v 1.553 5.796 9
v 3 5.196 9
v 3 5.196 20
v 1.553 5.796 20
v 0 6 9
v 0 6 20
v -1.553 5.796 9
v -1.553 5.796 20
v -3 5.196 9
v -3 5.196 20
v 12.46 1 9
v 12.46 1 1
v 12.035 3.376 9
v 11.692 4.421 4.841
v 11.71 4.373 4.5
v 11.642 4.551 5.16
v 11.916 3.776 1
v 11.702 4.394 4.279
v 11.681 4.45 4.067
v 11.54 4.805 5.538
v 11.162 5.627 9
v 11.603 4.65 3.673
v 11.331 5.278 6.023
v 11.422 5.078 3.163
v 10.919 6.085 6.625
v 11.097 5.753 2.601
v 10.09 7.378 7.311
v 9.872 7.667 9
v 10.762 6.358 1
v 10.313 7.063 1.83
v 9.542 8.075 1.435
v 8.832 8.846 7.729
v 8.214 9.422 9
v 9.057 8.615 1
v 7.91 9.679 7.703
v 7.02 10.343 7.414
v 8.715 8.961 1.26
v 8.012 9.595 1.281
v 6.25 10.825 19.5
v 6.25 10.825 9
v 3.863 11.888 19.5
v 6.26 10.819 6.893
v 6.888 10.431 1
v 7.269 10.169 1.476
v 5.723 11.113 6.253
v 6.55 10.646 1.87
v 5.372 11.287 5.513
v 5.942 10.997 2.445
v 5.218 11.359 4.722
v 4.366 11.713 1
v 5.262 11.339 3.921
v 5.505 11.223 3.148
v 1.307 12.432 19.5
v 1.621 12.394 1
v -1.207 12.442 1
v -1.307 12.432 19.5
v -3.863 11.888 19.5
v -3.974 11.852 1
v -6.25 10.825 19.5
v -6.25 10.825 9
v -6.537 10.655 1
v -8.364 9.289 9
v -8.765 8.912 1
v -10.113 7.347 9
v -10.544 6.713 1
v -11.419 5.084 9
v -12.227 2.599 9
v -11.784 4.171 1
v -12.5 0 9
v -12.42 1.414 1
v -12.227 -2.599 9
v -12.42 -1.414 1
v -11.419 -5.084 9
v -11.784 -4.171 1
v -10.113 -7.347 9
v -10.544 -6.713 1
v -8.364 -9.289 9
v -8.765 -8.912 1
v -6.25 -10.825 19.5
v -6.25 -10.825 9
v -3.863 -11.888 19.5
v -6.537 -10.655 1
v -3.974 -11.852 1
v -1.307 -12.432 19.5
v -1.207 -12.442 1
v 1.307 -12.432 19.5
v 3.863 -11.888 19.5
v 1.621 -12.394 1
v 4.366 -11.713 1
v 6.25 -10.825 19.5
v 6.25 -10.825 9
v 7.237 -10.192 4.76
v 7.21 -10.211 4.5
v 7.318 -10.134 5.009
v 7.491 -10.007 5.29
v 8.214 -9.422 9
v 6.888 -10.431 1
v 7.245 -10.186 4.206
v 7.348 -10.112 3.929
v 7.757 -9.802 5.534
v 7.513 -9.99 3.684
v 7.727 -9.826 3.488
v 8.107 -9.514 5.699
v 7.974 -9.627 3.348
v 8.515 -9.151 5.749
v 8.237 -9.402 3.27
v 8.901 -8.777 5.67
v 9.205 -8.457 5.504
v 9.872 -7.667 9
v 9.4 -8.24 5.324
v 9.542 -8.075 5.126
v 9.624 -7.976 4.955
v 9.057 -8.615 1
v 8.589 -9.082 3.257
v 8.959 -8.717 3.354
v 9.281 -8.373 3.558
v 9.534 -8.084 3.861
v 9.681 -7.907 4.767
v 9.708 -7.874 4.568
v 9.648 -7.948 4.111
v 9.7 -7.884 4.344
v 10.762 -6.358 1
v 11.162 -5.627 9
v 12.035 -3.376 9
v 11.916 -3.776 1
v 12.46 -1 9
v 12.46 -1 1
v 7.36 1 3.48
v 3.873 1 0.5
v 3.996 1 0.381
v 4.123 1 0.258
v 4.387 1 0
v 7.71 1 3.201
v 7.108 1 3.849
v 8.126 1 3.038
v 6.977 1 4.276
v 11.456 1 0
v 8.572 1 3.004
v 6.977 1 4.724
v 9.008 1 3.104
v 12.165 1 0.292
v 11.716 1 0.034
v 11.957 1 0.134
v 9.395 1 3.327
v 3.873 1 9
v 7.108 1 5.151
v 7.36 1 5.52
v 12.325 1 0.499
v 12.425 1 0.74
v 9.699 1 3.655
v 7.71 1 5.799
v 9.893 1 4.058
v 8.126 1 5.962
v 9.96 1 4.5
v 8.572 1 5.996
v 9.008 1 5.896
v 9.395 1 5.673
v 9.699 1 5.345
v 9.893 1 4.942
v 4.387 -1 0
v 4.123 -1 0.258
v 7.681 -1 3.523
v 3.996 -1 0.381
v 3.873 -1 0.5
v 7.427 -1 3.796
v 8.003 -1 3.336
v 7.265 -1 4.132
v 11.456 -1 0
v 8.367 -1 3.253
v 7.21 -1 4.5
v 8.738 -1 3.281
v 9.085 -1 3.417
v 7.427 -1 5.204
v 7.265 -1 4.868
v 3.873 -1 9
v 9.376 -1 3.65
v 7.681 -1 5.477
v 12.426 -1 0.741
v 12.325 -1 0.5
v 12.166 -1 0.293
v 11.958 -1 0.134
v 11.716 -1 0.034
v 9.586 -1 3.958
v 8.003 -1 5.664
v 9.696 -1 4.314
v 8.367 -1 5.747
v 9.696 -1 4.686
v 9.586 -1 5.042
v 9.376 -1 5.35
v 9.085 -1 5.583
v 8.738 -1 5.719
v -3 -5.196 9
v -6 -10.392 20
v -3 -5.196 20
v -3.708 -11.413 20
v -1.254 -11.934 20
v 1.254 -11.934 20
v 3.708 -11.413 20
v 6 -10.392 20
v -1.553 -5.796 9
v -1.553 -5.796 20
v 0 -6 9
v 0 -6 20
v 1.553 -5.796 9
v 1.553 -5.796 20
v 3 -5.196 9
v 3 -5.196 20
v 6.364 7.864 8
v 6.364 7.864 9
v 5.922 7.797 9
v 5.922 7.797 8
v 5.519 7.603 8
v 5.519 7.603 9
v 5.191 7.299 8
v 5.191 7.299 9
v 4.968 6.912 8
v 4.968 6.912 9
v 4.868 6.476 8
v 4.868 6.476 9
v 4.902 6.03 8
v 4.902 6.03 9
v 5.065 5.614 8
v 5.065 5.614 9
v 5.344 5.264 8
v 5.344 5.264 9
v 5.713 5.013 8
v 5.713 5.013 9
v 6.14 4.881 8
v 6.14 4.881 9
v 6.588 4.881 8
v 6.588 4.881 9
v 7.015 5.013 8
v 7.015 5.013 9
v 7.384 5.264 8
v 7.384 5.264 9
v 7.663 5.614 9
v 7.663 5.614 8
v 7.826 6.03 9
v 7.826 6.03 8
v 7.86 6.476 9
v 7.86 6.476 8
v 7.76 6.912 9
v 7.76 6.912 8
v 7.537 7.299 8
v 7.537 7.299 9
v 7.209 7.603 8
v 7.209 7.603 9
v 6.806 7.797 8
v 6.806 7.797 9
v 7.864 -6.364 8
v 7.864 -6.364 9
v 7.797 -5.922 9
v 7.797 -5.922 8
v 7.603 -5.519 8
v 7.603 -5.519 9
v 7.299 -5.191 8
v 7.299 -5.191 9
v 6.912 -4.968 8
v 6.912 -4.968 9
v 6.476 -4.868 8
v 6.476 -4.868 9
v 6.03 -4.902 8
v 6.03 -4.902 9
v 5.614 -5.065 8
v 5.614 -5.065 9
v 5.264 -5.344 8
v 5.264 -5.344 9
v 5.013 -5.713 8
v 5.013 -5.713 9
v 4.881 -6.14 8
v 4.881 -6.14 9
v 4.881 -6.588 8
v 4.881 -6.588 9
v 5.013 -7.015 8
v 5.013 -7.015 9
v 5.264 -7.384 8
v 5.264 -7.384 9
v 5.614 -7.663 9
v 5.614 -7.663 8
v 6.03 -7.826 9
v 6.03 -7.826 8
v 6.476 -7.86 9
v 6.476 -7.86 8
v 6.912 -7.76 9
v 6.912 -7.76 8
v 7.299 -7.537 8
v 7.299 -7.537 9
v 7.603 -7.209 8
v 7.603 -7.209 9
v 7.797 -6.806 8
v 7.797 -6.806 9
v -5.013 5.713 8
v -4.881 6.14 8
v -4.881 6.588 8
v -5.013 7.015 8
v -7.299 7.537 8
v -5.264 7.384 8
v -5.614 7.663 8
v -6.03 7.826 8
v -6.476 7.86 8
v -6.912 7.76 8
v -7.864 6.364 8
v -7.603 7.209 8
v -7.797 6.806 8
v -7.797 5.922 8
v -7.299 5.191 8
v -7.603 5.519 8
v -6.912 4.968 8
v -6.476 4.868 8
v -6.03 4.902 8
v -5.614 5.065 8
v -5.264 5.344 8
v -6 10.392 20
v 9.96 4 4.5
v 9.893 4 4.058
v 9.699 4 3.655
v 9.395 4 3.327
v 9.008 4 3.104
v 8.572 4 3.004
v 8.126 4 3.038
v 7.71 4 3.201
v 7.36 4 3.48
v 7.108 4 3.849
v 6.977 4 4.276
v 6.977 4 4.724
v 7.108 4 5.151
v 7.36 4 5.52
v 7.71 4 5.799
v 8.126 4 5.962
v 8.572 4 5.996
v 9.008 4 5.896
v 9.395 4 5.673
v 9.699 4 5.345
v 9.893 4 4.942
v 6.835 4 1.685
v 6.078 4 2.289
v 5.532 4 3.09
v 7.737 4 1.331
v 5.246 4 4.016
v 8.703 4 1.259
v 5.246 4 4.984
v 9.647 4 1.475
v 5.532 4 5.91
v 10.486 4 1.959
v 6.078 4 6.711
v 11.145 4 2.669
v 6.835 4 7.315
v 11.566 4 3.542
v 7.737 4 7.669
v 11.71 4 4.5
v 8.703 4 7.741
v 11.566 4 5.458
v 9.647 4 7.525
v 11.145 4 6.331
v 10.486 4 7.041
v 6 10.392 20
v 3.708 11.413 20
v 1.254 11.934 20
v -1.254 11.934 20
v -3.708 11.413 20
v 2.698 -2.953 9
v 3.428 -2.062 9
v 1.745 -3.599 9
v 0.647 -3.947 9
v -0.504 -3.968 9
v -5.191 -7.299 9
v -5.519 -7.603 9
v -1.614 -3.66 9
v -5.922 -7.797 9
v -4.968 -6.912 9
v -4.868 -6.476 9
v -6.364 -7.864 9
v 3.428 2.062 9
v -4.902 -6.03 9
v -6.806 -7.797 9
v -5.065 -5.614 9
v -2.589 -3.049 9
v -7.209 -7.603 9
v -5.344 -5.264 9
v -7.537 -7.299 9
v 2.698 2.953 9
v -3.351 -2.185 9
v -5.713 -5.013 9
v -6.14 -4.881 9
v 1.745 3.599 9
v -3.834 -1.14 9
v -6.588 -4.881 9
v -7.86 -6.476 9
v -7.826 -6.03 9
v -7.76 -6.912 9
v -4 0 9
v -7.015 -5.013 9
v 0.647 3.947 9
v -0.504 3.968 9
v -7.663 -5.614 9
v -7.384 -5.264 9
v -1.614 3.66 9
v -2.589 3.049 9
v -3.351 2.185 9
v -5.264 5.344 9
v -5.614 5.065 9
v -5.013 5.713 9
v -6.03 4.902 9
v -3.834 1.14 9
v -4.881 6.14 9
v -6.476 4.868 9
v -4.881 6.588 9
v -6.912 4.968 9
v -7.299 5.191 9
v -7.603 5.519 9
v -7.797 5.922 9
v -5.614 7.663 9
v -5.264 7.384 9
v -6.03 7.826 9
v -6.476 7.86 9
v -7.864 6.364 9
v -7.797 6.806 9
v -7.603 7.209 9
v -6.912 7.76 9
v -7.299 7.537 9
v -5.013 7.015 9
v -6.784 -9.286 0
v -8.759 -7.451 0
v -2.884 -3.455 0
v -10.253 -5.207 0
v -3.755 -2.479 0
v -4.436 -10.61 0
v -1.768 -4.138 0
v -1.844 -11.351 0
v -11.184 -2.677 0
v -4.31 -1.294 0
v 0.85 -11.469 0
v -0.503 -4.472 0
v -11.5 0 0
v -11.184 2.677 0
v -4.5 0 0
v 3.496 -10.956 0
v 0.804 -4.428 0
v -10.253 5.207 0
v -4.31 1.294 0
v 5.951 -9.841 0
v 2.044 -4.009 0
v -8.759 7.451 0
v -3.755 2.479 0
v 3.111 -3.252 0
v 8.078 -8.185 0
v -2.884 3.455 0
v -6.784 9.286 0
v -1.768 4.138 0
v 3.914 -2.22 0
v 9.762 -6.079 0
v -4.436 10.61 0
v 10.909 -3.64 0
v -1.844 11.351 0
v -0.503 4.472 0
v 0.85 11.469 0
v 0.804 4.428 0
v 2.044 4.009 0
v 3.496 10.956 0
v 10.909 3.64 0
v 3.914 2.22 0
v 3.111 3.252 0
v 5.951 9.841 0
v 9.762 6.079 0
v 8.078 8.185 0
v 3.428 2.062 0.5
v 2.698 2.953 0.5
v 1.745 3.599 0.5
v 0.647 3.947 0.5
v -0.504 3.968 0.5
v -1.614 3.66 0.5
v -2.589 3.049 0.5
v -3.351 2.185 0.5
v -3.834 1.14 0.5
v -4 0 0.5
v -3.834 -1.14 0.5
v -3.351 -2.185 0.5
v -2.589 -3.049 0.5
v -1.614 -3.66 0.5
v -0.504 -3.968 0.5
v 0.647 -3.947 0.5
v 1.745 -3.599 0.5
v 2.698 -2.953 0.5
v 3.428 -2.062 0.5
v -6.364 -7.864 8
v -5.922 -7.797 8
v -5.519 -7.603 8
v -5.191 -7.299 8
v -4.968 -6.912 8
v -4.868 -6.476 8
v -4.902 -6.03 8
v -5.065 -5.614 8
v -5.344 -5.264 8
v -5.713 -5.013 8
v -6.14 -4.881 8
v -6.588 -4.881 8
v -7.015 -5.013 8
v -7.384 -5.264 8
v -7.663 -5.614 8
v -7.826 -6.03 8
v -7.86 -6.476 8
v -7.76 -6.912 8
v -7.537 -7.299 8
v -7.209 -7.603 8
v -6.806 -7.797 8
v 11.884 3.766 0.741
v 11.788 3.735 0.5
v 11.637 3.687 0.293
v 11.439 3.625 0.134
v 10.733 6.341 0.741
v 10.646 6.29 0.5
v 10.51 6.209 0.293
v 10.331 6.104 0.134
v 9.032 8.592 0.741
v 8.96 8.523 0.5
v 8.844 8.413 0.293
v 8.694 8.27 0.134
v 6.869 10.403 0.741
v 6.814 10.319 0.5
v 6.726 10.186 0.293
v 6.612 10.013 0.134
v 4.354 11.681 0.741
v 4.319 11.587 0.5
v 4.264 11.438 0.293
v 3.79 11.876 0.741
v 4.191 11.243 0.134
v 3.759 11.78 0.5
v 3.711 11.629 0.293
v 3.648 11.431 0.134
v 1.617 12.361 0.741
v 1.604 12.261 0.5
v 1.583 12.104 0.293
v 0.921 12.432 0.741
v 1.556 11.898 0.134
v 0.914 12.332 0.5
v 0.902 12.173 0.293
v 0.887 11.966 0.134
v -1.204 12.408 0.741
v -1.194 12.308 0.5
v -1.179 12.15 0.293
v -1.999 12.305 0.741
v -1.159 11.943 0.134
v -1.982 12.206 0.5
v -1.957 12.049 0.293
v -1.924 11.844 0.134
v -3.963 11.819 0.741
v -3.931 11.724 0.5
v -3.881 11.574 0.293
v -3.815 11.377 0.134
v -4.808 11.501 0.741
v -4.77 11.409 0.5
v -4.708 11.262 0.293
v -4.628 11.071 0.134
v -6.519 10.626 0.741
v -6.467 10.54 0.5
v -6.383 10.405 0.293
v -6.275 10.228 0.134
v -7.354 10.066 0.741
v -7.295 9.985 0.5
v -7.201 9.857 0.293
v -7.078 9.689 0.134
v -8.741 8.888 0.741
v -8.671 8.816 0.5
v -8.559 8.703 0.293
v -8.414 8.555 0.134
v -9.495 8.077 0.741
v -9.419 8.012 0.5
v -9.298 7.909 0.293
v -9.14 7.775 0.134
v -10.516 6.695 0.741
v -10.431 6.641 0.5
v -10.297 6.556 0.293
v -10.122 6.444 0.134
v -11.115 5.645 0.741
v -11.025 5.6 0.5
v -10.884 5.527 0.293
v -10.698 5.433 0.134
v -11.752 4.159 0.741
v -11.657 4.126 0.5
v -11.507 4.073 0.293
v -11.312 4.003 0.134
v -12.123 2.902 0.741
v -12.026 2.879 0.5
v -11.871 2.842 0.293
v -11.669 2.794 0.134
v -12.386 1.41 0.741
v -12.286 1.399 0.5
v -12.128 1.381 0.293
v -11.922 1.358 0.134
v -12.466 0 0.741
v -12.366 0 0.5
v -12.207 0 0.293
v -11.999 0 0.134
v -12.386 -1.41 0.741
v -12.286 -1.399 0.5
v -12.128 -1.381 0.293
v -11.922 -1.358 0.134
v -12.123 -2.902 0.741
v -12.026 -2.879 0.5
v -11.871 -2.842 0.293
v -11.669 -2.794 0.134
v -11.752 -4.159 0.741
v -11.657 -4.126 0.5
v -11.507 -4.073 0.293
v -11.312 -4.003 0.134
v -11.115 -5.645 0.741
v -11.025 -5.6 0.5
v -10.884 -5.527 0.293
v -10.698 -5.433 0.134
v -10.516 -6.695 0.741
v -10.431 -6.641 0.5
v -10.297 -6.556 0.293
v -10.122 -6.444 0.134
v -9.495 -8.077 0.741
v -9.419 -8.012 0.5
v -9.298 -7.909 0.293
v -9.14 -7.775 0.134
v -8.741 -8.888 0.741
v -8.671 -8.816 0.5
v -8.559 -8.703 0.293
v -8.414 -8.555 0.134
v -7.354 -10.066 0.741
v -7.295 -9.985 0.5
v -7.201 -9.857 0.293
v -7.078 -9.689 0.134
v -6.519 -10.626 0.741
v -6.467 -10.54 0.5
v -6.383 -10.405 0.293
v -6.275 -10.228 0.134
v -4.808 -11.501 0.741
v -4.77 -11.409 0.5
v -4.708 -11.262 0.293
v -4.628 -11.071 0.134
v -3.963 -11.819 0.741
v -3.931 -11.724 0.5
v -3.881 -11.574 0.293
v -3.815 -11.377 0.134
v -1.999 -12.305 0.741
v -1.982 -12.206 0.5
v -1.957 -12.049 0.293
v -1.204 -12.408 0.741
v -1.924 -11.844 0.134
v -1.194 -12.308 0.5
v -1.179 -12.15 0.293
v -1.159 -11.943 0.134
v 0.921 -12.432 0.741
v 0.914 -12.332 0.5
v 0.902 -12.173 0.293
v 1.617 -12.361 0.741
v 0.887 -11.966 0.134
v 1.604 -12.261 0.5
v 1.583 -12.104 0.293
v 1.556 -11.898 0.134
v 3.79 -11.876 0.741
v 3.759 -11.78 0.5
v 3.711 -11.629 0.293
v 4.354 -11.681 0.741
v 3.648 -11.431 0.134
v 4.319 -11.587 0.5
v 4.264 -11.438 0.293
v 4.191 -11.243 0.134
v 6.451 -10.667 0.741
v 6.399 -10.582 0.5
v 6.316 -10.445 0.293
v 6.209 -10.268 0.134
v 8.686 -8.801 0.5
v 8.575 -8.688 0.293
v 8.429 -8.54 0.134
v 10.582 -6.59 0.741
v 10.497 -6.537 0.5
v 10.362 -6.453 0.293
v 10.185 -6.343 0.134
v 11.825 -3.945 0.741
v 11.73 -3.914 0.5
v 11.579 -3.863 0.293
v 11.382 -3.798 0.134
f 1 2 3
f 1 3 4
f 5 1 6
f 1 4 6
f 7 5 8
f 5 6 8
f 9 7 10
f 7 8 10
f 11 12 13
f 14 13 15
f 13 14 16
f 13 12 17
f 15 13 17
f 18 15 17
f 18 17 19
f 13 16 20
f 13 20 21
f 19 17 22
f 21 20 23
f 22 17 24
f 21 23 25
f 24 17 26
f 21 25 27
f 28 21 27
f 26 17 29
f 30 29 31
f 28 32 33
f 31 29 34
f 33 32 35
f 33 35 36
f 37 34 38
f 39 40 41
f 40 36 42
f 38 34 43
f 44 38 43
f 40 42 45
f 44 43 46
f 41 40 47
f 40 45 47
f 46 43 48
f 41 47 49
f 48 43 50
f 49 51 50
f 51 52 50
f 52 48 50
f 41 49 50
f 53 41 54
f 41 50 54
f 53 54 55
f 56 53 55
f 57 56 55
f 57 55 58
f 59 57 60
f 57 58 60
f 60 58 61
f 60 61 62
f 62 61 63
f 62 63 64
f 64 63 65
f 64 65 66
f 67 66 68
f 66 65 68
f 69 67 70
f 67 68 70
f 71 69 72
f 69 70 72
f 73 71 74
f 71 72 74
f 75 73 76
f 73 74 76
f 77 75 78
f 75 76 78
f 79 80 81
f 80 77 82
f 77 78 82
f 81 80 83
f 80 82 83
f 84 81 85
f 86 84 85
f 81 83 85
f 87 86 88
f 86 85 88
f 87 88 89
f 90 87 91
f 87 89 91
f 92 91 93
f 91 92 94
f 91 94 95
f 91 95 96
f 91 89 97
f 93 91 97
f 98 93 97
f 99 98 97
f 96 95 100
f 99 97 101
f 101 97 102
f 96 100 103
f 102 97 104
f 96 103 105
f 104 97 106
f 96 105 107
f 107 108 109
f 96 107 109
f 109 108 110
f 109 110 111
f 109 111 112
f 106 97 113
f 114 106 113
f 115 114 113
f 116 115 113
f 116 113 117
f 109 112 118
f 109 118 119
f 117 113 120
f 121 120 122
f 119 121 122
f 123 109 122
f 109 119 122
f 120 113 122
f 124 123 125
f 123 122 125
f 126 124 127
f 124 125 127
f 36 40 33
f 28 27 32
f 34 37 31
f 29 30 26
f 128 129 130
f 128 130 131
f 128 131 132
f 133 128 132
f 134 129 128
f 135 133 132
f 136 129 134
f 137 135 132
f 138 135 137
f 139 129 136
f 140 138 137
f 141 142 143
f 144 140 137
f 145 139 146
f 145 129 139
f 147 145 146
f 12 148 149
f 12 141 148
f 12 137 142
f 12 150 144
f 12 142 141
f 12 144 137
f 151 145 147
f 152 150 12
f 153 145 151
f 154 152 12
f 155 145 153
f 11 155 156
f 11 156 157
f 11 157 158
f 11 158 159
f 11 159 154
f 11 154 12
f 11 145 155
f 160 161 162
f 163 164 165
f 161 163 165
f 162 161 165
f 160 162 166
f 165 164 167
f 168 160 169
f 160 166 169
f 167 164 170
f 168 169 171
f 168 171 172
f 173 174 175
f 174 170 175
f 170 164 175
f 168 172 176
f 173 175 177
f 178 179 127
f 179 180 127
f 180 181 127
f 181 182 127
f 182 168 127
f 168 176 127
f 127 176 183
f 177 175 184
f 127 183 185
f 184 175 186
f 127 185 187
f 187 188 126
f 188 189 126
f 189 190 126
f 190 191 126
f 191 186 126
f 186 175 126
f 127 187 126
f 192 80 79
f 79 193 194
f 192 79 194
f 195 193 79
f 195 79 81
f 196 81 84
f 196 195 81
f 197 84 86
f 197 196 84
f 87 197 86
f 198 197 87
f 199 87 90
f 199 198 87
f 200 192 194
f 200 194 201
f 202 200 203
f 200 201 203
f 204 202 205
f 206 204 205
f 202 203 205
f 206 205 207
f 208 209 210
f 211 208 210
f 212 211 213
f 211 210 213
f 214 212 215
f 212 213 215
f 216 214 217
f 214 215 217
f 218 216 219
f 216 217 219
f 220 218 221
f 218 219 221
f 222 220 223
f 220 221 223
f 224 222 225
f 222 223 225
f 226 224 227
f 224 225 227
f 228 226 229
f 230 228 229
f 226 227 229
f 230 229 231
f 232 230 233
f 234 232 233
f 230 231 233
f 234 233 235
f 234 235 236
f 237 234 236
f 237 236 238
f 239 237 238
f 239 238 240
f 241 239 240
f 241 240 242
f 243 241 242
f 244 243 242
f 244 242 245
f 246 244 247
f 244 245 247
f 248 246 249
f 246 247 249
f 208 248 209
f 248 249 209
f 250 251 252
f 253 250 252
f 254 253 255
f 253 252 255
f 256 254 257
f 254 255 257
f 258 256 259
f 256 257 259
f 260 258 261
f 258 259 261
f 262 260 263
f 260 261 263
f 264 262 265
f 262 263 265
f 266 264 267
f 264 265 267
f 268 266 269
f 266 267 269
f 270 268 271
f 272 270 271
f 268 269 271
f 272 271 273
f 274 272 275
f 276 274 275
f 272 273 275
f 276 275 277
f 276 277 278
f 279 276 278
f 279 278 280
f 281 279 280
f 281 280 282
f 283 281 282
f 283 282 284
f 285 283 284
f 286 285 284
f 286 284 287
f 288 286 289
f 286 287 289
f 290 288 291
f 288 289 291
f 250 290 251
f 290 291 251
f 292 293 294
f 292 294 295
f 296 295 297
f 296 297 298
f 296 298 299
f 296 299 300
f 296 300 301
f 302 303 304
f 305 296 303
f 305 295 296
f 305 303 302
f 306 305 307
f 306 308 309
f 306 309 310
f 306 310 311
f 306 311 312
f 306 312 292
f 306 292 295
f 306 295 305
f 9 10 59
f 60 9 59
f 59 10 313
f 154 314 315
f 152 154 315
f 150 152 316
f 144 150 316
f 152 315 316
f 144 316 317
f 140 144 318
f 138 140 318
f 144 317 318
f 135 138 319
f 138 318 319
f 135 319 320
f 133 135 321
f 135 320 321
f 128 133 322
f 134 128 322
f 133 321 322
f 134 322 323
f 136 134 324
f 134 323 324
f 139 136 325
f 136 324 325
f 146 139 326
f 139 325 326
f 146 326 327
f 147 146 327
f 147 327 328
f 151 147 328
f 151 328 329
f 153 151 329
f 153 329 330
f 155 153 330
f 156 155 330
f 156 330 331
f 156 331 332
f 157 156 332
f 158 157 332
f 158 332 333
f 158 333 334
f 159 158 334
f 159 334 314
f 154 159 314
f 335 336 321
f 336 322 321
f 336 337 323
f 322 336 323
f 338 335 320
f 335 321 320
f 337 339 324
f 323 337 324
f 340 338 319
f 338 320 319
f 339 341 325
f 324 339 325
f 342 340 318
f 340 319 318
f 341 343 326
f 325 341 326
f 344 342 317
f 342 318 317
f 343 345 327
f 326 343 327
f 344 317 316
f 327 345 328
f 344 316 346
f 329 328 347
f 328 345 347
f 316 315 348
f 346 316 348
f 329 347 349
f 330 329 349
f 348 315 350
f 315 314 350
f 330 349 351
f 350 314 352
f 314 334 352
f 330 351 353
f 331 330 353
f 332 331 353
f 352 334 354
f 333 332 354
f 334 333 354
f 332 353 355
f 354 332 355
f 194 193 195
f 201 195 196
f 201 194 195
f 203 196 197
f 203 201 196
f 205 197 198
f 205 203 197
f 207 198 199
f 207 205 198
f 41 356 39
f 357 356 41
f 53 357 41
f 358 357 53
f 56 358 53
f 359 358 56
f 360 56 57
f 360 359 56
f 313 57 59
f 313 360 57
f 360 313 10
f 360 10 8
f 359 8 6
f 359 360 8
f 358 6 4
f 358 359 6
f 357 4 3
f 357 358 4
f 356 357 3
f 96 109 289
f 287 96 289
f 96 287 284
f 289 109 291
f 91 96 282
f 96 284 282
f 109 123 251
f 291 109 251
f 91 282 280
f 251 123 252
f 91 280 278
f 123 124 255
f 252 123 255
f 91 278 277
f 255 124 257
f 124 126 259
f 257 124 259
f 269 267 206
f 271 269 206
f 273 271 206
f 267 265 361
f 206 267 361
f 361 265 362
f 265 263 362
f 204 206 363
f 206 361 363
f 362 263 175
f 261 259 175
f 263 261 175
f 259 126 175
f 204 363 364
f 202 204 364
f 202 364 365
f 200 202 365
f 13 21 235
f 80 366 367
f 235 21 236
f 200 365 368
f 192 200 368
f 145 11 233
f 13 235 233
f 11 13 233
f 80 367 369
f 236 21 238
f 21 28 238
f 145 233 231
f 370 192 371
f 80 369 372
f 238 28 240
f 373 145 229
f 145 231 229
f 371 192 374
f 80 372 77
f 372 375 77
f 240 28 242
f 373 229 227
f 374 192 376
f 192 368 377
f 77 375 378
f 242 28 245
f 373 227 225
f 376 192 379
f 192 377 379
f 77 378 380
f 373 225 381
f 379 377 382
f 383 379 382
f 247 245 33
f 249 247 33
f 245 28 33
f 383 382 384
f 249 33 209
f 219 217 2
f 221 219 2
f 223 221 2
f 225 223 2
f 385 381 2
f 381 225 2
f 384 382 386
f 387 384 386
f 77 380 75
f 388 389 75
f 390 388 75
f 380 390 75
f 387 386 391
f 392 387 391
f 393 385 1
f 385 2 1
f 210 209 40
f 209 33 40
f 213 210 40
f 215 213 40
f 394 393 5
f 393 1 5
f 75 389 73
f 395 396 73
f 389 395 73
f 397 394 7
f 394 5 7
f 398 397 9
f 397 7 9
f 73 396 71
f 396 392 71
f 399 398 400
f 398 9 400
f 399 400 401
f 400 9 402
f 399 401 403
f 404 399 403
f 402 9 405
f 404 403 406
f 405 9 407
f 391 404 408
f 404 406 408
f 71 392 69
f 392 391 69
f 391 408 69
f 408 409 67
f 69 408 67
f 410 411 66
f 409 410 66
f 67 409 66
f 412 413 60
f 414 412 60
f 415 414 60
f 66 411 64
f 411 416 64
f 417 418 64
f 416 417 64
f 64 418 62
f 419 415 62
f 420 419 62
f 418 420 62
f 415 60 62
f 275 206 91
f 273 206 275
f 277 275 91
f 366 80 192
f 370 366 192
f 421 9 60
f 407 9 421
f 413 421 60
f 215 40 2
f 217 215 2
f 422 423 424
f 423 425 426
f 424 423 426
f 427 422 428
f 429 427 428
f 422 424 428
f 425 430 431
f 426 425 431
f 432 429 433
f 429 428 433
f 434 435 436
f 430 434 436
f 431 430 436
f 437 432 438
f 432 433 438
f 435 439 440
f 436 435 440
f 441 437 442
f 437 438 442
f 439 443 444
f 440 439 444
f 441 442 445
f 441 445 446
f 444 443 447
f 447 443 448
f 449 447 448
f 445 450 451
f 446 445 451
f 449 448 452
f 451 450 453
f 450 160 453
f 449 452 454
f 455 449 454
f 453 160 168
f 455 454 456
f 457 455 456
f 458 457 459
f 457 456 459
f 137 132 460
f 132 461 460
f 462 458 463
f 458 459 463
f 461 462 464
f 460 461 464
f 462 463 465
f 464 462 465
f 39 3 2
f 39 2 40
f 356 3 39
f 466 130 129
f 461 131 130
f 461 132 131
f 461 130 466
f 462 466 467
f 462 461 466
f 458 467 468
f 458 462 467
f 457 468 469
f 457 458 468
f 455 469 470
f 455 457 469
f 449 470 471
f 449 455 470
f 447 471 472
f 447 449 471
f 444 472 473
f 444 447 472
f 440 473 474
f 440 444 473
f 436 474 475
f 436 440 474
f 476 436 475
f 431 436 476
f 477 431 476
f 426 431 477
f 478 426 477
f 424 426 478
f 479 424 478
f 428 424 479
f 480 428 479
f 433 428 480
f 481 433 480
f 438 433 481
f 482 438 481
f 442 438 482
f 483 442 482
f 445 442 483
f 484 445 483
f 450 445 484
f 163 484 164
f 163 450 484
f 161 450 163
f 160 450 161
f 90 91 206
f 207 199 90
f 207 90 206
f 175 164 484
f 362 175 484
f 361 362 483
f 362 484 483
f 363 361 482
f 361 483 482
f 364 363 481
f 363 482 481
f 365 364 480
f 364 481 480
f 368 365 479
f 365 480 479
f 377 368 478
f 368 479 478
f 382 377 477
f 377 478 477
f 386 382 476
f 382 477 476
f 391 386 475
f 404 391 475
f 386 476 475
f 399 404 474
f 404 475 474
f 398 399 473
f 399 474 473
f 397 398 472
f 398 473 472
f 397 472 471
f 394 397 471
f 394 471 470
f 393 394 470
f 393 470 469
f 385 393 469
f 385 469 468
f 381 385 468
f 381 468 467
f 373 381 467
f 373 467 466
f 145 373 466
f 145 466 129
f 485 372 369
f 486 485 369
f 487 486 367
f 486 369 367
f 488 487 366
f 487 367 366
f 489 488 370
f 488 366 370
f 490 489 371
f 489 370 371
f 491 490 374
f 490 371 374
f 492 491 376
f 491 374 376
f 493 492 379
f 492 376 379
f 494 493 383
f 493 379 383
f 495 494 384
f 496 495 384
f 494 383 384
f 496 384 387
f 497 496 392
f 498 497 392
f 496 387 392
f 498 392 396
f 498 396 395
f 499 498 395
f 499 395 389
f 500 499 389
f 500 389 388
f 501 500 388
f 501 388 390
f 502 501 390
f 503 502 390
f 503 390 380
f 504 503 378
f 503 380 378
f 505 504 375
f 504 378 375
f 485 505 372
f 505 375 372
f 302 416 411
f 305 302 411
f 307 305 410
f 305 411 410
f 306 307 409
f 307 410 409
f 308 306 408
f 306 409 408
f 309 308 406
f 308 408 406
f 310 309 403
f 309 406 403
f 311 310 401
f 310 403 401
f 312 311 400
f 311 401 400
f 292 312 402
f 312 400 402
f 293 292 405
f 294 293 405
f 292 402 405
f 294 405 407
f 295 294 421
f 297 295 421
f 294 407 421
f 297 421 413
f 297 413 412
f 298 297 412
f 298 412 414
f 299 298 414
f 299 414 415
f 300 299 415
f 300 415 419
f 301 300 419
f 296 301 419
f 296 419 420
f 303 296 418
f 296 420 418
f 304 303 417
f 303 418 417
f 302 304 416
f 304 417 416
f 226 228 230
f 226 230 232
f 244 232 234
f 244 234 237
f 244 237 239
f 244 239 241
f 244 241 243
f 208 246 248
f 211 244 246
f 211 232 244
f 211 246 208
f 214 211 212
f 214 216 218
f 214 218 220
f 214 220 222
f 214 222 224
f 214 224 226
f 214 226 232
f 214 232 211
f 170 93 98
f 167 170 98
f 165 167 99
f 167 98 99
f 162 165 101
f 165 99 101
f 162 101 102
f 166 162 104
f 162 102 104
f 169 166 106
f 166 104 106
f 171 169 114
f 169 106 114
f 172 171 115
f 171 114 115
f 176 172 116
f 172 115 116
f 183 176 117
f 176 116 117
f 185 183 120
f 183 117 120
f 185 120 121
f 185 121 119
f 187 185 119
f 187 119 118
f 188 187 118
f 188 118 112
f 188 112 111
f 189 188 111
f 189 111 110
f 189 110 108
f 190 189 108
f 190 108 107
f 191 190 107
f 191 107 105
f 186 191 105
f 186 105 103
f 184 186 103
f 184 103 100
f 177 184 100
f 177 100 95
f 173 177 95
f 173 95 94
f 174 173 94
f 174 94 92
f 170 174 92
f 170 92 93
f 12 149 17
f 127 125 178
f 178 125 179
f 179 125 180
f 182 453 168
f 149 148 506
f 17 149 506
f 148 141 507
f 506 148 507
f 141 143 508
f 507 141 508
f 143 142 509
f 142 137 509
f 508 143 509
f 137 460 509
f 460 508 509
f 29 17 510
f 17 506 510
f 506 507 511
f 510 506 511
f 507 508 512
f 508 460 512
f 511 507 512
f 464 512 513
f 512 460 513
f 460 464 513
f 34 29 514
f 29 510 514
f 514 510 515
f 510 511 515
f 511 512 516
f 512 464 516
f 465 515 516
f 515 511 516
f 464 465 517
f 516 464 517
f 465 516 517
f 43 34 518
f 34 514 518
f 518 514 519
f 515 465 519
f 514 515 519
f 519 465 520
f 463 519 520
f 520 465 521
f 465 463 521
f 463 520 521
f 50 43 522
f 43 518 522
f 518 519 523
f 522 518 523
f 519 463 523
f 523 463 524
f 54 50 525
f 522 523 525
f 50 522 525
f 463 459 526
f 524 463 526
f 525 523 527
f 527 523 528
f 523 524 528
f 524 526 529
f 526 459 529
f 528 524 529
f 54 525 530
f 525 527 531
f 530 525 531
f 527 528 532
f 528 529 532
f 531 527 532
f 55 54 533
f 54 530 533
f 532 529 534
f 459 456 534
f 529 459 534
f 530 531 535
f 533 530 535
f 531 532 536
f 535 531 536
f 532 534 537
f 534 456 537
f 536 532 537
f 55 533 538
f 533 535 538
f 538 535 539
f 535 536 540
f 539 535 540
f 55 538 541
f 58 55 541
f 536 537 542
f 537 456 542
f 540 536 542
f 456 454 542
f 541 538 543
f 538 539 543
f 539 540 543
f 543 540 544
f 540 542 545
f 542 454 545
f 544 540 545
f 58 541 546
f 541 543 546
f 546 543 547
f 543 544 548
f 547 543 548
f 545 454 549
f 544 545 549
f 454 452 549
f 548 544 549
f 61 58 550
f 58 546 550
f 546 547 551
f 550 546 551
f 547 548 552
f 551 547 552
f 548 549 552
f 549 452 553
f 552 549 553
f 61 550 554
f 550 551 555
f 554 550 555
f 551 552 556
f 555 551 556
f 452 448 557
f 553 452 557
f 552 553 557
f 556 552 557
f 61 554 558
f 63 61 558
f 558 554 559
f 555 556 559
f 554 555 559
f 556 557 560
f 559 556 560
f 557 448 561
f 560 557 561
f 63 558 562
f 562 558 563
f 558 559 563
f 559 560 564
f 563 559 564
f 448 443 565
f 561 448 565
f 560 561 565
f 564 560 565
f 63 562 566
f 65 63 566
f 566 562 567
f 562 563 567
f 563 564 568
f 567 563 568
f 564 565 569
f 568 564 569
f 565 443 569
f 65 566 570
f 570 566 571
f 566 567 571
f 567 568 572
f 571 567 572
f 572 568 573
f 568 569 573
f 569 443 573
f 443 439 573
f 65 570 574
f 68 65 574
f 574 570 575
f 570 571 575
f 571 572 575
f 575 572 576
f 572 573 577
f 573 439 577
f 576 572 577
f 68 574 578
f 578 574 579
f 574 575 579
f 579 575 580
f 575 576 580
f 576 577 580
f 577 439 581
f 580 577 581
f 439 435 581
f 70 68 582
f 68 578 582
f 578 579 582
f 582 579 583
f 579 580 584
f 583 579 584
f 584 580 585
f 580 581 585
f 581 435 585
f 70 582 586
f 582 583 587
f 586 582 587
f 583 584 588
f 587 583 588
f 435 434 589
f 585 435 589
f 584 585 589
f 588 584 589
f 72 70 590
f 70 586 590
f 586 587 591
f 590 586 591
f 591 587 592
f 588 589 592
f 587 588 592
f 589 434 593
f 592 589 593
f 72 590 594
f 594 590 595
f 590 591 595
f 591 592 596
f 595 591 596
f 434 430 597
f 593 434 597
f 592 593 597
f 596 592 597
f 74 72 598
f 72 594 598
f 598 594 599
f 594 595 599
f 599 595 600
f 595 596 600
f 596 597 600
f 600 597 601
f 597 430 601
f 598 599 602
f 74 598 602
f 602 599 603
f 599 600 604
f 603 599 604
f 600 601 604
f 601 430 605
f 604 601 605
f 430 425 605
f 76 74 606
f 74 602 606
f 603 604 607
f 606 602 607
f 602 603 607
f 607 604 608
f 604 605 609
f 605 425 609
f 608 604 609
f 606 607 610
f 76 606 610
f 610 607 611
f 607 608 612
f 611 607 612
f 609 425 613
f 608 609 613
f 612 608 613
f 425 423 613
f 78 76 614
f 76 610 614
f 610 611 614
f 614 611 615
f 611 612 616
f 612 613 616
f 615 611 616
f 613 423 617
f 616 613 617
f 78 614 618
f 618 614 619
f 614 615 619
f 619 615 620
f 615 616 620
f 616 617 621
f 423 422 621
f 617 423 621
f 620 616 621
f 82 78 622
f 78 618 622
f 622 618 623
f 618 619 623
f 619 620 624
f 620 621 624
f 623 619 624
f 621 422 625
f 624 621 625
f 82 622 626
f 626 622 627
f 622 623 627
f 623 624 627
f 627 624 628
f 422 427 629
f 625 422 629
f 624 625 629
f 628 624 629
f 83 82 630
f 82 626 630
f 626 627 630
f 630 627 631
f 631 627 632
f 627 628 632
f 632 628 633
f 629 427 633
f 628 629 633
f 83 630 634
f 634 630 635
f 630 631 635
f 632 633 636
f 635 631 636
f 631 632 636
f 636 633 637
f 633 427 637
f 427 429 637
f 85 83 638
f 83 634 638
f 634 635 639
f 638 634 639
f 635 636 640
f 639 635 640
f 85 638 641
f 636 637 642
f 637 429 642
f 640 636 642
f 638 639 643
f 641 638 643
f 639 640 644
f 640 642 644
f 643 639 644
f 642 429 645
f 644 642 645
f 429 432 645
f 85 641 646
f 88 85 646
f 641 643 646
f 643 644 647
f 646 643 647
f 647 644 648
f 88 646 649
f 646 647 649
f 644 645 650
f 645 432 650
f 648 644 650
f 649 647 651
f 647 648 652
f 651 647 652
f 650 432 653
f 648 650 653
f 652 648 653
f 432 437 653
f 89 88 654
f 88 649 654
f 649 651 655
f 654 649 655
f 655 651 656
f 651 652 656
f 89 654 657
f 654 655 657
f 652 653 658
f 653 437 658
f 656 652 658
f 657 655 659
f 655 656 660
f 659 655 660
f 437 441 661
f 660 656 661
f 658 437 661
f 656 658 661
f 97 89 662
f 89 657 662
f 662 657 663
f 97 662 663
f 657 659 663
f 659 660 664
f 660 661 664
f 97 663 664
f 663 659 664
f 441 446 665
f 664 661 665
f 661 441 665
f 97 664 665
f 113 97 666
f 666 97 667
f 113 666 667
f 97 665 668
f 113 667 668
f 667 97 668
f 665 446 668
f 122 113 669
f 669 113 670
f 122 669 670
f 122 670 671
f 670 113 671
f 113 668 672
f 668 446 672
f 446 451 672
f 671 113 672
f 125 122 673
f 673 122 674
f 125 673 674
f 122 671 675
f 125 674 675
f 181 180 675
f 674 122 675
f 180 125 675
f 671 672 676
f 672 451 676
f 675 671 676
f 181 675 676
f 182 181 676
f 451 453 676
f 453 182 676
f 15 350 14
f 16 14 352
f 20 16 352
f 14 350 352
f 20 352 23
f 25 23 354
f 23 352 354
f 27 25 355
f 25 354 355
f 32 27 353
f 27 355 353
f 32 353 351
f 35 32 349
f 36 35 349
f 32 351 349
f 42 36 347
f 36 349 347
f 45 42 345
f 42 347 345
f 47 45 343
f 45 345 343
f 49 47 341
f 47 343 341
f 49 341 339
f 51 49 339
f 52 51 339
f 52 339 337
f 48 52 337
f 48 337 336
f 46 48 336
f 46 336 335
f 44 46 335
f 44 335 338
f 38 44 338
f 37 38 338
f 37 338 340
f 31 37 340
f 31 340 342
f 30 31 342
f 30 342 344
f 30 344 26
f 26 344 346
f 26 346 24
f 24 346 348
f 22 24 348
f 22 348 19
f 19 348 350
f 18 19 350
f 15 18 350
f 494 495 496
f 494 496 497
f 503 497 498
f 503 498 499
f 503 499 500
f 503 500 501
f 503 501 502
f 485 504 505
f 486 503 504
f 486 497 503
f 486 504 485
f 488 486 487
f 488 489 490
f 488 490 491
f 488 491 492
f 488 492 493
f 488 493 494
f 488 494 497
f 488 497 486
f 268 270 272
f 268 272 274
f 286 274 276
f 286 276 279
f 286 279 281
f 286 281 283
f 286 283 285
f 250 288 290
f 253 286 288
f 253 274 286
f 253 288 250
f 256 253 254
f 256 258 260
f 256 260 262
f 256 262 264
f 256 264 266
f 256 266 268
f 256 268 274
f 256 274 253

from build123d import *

# Parameters (mm, degrees)
ESBO_O1_R                 = 12.5
RESSALTO_EXTRUS_O1_DEPTH  = 20
CORTE_EXTRUS_O3_DEPTH     = 11
ESBO_O3_R                 = 4
CORTE_EXTRUS_O4_DEPTH     = 21
ESBO_O6_W                 = 12
ESBO_O6_H                 = 2
CORTE_EXTRUS_O5_DEPTH     = 10
CORTE_EXTRUS_O6_START     = -3
ESBO_O7_R                 = 3.25
CORTE_EXTRUS_O6_DEPTH     = 9.5
FURO_ROSCADO_DE_M3X0_51_D = 2.5
FILETE1_R                 = 1
ESBO_O10_R                = 1.5
CORTE_EXTRUS_O7_DEPTH     = 1
CHANFRO1_SIZE             = 0.5
CORTE_EXTRUS_O8_REACH     = 18.5
ESBO_O11_R                = 1.5
ESBO_O12_R                = 6
CORTE_EXTRUS_O9_DEPTH     = 11
PADR_OCIRCULAR1_COUNT     = 4
CHANFRO2_SIZE             = 0.5


with BuildPart() as part:
    # Esboço1 → Ressalto-extrusão1 (new body)
    with BuildSketch(Plane.XY):
        Circle(ESBO_O1_R)
    extrude(amount=RESSALTO_EXTRUS_O1_DEPTH)

    # Esboço2 → Corte-extrusão3 (cut)
    with BuildSketch(Plane.XY.offset(20)):
        with BuildLine():
            Line((0, 0), (6.25, 10.825317547))
            ThreePointArc((6.25, 10.825317547), (12.5, 0), (6.25, -10.825317547))
            Line((6.25, -10.825317547), (0, 0))
        make_face()
    corte_extrus_o3 = extrude(amount=-CORTE_EXTRUS_O3_DEPTH, mode=Mode.SUBTRACT)

    # Esboço3 → Corte-extrusão4 (cut, through all)
    with BuildSketch(Plane(origin=(0, 0, 0), x_dir=(-1, 0, 0), z_dir=(0, 0, -1))):
        Circle(ESBO_O3_R)
    extrude(amount=-CORTE_EXTRUS_O4_DEPTH, mode=Mode.SUBTRACT)

    # Espelhar1: Corte-extrusão3 across plane
    add(corte_extrus_o3.mirror(Plane(origin=(0, 0, 0), x_dir=(0, 0, 1), z_dir=(1, 0, 0))), mode=Mode.SUBTRACT)

    # Esboço6 → Corte-extrusão5 (cut, through all)
    with BuildSketch(Plane.XY.offset(9)):
        with Locations((7, 0)):
            Rectangle(ESBO_O6_W, ESBO_O6_H)
    extrude(amount=-CORTE_EXTRUS_O5_DEPTH, mode=Mode.SUBTRACT)

    # Esboço7 → Corte-extrusão6 (cut, through all)
    with BuildSketch(Plane.XZ.offset(-1).offset(CORTE_EXTRUS_O6_START)):
        with Locations((8.459935794, 4.5)):
            Circle(ESBO_O7_R)
    extrude(amount=-CORTE_EXTRUS_O6_DEPTH, mode=Mode.SUBTRACT)

    # Furo roscado de M3x0.51 (through all)
    with Locations(Plane(origin=(0, 4, 0), x_dir=(1, 0, 0), z_dir=(0, 1, 0))):
        with Locations((8.459935794, -4.5)):
            Hole(FURO_ROSCADO_DE_M3X0_51_D / 2)

    # Filete1
    filete1_edges = [part.edges().sort_by_distance(p)[0] for p in [
        (-12.5, 0, 0),
    ]]
    fillet(filete1_edges, radius=FILETE1_R)

    # Esboço10 → Corte-extrusão7 (cut)
    with BuildSketch(Plane.XY.offset(9)):
        with Locations((6.363961031, -6.363961031)):
            Circle(ESBO_O10_R)
    corte_extrus_o7 = extrude(amount=-CORTE_EXTRUS_O7_DEPTH, mode=Mode.SUBTRACT)

    # Chanfro1
    chanfro1_edges = [part.edges().sort_by_distance(p)[0] for p in [
        (0, -12.5, 20),
        (0, 12.5, 20),
    ]]
    chamfer(chanfro1_edges, length=CHANFRO1_SIZE)

    # Esboço11 → Corte-extrusão8 (cut, up to next)
    with BuildSketch(Plane(origin=(0, 4, 0), x_dir=(1, 0, 0), z_dir=(0, 1, 0)), mode=Mode.PRIVATE) as corte_extrus_o8_sk1:
        with Locations((8.459935794, -4.5)):
            Circle(ESBO_O11_R)
    corte_extrus_o8_tool1 = extrude(corte_extrus_o8_sk1.sketch, amount=-CORTE_EXTRUS_O8_REACH, mode=Mode.PRIVATE) & part.part
    add(corte_extrus_o8_tool1.solids().sort_by_distance((8.459936, 4, 4.5))[0], mode=Mode.SUBTRACT)

    # Esboço12 → Corte-extrusão9 (cut)
    with BuildSketch(Plane.XY.offset(20)):
        Circle(ESBO_O12_R)
    extrude(amount=-CORTE_EXTRUS_O9_DEPTH, mode=Mode.SUBTRACT)

    # PadrãoCircular1: Corte-extrusão7 ×4 about axis
    padr_ocircular1_axis = Axis((0, 0, 0), (0, 0, 1))
    for i in range(1, PADR_OCIRCULAR1_COUNT):
        add(corte_extrus_o7.rotate(padr_ocircular1_axis, i * 360 / PADR_OCIRCULAR1_COUNT), mode=Mode.SUBTRACT)

    # Chanfro2
    chanfro2_edges = [part.edges().sort_by_distance(p)[0] for p in [
        (-4, 0, 0),
    ]]
    chamfer(chanfro2_edges, length=CHANFRO2_SIZE)


solid = part.part
